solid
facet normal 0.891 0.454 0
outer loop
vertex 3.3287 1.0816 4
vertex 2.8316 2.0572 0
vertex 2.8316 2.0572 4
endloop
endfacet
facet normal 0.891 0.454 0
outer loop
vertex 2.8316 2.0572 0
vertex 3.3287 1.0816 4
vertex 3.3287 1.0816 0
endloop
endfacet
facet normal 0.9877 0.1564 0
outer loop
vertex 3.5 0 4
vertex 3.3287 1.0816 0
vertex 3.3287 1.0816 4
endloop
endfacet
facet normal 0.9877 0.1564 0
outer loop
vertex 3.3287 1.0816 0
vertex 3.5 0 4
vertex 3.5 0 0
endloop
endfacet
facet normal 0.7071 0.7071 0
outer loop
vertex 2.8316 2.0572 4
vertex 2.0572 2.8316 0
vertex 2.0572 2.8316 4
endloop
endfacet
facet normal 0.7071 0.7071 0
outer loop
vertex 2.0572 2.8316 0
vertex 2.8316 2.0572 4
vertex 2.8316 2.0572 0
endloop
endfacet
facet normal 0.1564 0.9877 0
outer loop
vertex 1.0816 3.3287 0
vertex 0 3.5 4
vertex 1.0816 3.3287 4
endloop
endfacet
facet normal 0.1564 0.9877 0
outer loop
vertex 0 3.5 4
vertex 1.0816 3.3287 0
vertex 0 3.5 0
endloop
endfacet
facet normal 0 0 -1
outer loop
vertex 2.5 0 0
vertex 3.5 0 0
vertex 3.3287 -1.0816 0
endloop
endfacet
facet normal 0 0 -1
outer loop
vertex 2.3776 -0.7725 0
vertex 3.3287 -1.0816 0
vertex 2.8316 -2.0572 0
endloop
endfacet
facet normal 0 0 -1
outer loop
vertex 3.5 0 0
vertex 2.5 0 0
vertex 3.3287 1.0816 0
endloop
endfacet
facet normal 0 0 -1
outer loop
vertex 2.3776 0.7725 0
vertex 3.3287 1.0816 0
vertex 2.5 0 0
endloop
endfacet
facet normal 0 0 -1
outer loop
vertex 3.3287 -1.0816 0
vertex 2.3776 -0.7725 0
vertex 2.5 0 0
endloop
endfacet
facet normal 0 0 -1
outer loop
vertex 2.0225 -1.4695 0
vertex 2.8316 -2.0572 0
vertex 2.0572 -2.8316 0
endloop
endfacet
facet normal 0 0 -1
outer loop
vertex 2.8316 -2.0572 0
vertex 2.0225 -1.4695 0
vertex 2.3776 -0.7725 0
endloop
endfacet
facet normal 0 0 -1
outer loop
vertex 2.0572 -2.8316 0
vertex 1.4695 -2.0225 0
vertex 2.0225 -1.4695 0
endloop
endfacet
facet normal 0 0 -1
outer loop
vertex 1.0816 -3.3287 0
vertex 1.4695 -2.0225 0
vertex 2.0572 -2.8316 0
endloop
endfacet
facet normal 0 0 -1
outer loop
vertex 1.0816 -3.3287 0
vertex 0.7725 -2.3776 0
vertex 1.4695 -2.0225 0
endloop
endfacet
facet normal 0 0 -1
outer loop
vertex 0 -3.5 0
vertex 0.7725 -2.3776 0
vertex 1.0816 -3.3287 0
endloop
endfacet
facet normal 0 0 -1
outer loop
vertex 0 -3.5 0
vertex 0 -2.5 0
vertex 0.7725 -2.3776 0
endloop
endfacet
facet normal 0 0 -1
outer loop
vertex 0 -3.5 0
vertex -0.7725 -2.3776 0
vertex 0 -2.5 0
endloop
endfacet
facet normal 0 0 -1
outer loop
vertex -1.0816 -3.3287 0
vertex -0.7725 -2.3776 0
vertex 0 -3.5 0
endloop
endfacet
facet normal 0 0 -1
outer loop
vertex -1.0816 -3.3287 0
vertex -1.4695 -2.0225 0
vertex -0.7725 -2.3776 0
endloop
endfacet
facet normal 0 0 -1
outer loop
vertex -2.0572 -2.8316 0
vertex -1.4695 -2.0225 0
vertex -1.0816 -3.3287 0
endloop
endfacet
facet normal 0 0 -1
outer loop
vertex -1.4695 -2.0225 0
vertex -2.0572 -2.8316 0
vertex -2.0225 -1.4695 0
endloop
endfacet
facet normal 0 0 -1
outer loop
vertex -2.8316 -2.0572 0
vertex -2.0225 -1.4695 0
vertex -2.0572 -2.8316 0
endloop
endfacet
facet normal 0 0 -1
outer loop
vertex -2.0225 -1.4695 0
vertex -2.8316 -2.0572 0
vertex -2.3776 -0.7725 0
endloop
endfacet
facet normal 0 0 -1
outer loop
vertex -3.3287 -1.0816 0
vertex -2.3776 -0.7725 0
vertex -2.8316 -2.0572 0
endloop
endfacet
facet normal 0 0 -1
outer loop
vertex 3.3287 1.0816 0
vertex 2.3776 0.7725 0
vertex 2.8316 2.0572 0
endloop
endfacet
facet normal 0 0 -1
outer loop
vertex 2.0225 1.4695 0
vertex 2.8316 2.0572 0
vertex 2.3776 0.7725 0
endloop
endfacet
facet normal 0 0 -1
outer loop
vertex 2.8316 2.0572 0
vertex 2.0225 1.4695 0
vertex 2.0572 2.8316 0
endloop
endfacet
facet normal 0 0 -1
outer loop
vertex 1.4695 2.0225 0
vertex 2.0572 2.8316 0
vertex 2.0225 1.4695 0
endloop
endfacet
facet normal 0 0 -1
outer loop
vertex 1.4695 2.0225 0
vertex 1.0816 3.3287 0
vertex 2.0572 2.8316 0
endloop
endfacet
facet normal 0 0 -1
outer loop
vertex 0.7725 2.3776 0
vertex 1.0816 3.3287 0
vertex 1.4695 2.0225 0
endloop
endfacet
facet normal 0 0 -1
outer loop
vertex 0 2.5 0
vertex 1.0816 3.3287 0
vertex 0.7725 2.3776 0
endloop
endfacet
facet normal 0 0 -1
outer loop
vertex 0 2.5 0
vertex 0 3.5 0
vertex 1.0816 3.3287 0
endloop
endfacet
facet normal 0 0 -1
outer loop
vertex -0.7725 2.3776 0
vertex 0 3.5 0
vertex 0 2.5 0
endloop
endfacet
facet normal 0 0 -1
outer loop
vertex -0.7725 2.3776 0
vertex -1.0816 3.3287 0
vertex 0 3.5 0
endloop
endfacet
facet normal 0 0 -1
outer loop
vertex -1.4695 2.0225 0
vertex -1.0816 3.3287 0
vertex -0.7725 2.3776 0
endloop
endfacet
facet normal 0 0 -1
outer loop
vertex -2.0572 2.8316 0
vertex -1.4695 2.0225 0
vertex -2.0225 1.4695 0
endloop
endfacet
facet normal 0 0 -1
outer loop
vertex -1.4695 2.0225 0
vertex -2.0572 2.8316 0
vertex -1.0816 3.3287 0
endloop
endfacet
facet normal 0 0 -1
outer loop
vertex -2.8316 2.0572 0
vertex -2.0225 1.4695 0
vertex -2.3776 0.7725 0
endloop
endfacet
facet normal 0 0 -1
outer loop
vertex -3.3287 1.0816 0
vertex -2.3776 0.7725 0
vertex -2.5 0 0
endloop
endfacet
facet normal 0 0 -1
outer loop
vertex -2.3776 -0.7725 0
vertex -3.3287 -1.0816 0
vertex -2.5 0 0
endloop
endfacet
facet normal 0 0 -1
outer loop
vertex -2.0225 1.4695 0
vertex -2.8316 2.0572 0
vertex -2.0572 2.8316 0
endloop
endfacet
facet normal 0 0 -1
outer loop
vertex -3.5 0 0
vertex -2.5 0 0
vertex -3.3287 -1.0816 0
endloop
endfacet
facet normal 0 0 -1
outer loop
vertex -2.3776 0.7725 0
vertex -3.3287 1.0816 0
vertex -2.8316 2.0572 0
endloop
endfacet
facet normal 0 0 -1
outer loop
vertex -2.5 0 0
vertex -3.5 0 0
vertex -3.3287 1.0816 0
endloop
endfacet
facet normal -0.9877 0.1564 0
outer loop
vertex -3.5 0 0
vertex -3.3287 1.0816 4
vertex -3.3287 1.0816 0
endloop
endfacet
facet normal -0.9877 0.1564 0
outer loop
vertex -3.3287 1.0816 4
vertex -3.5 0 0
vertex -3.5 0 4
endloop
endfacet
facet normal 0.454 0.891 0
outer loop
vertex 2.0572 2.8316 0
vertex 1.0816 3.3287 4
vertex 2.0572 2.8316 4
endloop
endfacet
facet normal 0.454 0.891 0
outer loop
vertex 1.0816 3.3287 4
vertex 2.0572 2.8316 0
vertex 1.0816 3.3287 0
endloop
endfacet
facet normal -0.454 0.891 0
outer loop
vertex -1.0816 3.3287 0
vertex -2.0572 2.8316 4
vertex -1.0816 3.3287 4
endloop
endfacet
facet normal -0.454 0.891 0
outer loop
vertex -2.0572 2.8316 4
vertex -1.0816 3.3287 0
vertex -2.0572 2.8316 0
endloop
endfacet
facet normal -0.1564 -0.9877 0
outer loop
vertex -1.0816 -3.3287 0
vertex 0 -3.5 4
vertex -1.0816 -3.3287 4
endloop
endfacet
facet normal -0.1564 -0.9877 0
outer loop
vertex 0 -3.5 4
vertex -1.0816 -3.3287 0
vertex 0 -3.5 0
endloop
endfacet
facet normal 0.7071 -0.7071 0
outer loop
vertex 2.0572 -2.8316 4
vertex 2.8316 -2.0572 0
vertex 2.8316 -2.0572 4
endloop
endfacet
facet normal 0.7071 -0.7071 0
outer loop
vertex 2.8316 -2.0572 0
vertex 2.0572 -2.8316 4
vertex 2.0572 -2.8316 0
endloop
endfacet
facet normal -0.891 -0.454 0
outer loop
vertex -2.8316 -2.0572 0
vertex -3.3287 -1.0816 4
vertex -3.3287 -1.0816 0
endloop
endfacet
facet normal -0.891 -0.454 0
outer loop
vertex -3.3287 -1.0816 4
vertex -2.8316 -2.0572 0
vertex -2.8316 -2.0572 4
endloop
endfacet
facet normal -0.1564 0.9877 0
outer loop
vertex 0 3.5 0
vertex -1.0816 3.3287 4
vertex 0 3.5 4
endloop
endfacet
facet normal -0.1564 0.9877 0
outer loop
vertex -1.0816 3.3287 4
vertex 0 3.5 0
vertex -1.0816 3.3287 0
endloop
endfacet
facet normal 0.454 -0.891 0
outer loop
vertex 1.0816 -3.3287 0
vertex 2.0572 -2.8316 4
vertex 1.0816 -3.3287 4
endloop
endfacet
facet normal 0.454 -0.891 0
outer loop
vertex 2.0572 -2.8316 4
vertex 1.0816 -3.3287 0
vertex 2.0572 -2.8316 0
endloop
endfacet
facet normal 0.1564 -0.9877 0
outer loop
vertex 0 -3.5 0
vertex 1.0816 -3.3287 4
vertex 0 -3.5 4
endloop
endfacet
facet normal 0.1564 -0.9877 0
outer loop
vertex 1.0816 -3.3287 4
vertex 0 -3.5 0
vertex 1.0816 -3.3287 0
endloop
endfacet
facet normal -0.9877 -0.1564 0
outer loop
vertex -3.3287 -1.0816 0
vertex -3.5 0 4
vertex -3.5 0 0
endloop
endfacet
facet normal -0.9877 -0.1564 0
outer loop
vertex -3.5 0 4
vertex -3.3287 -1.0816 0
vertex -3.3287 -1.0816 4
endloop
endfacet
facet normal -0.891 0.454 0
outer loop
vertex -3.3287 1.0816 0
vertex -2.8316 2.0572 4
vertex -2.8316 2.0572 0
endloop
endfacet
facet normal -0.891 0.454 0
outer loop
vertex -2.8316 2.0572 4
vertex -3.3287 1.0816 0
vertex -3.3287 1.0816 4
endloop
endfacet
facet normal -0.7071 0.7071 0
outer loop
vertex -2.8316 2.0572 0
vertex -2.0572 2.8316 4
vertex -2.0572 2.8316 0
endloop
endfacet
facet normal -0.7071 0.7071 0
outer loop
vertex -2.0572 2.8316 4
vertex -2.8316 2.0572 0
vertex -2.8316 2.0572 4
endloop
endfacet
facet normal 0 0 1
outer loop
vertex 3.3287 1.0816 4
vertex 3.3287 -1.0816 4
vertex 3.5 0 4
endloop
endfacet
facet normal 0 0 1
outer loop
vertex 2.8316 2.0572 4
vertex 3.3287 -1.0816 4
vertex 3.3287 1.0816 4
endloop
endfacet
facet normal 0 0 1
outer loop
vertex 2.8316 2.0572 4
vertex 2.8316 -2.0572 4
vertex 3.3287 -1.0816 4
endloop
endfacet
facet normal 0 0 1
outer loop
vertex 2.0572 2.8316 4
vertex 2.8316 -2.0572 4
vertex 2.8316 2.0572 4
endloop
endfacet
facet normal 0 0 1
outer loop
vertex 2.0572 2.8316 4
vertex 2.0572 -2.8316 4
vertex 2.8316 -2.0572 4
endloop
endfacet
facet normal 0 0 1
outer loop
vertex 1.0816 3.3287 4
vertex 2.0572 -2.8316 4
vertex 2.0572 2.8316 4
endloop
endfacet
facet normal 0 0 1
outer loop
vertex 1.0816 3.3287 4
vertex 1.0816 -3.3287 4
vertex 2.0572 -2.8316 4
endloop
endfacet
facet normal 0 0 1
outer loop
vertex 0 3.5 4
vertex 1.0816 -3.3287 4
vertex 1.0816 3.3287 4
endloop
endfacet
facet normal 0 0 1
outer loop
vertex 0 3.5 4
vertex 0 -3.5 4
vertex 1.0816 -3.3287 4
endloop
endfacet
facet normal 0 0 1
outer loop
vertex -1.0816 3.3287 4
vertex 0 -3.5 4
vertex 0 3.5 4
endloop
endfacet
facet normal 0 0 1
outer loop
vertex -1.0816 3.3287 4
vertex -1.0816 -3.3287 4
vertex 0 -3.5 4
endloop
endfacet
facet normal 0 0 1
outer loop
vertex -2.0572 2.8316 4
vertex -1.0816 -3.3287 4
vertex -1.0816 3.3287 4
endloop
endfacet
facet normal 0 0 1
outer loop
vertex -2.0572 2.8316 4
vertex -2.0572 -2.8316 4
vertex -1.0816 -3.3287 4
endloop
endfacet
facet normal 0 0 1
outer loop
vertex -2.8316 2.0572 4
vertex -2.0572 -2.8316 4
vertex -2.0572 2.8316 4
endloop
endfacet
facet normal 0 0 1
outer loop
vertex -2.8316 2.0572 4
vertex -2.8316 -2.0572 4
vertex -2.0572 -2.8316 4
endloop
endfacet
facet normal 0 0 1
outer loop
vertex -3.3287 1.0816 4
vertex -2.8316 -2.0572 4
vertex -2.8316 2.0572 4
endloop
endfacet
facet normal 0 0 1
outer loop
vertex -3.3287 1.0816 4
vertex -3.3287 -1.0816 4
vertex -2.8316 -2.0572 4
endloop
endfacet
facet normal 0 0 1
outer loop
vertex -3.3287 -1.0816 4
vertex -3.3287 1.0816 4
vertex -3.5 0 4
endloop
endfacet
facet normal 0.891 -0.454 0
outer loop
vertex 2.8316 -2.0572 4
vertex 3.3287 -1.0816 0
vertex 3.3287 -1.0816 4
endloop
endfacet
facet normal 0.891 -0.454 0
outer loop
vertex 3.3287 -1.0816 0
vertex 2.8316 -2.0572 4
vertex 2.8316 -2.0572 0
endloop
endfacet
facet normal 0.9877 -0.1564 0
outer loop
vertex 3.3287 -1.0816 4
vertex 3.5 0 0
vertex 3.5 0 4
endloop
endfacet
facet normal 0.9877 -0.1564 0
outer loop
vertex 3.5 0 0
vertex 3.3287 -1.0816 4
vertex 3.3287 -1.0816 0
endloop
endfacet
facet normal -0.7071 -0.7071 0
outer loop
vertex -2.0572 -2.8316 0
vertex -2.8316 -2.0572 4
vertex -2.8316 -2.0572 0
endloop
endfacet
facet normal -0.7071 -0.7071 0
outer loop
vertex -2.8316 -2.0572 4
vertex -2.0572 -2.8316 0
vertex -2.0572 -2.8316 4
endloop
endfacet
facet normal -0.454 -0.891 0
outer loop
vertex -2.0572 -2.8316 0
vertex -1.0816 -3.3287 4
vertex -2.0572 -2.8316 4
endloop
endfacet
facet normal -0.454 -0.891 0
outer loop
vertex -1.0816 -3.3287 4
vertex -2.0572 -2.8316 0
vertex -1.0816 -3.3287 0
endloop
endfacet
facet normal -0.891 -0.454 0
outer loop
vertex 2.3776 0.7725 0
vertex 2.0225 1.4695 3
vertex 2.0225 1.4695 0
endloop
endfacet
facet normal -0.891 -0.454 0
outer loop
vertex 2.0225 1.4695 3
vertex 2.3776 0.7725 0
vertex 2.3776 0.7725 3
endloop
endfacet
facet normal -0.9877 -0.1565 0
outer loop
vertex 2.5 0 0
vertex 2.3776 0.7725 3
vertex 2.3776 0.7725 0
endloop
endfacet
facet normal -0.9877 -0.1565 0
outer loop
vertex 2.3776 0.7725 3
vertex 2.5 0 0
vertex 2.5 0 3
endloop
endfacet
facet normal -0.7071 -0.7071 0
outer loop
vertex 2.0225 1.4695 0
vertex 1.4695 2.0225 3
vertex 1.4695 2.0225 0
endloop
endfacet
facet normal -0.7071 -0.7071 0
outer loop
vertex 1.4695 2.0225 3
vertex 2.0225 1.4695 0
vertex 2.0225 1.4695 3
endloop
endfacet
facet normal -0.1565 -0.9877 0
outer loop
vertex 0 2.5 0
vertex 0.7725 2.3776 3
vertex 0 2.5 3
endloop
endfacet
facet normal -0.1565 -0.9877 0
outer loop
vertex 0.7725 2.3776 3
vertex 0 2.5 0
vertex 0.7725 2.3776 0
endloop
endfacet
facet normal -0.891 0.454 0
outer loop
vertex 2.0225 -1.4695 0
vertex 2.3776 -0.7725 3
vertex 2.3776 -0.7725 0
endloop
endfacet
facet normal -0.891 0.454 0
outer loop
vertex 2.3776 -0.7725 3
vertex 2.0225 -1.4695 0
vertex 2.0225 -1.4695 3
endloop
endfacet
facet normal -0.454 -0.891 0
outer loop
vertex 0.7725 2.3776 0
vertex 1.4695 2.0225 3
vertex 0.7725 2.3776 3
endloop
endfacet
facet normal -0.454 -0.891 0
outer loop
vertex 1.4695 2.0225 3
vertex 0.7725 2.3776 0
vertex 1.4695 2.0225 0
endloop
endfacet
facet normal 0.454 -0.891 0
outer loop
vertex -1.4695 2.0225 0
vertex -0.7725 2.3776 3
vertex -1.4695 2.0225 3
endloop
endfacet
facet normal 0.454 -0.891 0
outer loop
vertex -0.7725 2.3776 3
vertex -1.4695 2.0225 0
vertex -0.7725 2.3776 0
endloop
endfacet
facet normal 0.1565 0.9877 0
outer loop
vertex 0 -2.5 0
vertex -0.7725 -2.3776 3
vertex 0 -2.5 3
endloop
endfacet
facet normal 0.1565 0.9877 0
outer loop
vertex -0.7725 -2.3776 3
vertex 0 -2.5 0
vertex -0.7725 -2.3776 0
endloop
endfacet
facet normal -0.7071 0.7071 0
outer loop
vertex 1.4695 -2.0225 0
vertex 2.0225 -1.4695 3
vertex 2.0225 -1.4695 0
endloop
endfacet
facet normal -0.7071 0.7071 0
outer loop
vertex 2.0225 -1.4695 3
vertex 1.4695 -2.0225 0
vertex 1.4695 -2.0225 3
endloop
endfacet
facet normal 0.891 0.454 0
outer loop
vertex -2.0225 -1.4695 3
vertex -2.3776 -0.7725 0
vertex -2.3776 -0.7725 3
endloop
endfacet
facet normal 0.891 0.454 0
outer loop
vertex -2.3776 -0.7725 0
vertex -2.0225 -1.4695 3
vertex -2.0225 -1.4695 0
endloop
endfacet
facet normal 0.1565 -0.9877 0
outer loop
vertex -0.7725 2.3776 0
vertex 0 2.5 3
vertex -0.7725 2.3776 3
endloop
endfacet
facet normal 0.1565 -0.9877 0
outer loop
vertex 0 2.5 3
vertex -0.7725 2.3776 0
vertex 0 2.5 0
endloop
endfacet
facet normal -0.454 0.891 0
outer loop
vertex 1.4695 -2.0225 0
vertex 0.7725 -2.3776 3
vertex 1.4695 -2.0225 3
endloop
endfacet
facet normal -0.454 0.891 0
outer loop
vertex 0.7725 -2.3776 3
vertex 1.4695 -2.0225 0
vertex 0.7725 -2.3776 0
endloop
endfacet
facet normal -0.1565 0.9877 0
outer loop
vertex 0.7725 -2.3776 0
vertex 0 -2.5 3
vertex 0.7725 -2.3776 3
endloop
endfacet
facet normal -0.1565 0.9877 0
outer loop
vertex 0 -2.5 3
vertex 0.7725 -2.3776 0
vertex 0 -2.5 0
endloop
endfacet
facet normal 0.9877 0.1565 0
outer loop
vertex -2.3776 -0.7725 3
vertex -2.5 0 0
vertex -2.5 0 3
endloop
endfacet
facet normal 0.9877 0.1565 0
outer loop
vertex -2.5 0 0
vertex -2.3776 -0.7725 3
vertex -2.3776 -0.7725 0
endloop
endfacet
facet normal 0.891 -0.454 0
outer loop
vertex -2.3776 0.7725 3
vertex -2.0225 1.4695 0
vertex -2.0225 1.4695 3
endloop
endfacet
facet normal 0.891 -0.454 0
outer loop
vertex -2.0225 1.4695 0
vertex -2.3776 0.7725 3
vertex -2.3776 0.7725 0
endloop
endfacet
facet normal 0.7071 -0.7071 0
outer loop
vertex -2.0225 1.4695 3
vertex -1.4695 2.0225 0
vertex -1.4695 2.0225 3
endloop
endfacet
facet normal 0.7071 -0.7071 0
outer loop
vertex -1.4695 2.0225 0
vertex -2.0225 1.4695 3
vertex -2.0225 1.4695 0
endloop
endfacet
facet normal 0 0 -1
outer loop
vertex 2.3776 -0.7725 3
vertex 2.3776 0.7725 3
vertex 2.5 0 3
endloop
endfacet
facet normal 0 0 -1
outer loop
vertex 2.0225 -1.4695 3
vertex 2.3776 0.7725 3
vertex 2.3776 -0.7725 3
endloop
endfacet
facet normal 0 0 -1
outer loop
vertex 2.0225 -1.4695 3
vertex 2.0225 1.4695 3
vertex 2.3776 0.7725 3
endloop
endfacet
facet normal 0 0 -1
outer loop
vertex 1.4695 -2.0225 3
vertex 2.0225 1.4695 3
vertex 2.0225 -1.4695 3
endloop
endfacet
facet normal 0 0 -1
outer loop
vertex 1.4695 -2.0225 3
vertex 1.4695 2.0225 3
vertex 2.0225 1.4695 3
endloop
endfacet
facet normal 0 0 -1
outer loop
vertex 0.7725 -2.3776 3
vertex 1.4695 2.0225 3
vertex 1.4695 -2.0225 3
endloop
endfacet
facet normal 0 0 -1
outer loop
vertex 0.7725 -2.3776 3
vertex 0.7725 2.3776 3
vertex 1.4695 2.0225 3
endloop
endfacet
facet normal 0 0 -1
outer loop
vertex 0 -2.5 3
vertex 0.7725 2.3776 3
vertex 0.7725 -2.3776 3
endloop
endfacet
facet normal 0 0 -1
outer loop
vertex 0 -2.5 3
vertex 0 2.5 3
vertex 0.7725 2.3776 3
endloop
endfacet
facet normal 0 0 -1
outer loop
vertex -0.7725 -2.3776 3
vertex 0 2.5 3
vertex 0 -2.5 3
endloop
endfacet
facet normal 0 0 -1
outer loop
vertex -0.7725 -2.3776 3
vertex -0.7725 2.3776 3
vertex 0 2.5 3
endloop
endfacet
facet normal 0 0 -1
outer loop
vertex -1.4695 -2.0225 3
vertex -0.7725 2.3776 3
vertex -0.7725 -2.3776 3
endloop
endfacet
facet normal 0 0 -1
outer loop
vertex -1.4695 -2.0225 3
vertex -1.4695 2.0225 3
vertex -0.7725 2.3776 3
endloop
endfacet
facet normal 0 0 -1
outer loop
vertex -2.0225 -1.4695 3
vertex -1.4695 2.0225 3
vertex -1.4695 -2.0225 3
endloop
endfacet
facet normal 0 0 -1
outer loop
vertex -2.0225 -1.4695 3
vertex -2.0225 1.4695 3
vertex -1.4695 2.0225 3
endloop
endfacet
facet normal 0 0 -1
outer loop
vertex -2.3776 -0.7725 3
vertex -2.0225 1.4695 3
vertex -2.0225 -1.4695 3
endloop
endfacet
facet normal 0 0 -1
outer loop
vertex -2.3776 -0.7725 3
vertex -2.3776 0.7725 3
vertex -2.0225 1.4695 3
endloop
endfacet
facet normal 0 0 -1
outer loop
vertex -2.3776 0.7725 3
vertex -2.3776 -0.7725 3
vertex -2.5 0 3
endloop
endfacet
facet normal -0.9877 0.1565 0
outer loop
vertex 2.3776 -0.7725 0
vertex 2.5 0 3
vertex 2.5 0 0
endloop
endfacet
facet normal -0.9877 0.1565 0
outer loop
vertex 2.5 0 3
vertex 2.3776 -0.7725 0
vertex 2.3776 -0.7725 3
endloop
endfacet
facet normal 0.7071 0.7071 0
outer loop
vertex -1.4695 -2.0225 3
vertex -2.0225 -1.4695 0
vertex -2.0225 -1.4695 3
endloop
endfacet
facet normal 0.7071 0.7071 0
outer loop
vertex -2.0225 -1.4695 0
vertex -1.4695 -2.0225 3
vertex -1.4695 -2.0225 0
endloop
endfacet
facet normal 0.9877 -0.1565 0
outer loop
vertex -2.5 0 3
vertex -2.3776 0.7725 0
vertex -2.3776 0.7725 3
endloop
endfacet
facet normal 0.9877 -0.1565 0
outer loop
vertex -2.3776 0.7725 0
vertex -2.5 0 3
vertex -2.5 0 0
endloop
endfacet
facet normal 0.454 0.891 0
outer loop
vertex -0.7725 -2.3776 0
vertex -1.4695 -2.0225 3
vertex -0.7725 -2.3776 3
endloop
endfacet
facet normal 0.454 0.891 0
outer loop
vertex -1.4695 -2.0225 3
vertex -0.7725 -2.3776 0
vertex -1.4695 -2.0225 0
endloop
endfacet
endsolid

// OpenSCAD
COUPLER_OUTER_RADIUS = 3.5;
COUPLER_WALL_WIDTH = 1;
COUPLER_TOP_WIDTH = 1;
COUPLER_HEIGHT = 4;

$fn=20;

difference() {
    cylinder(r=COUPLER_OUTER_RADIUS, h=COUPLER_HEIGHT);
    cylinder(r=COUPLER_OUTER_RADIUS-COUPLER_WALL_WIDTH, h=COUPLER_HEIGHT-COUPLER_TOP_WIDTH);
}
